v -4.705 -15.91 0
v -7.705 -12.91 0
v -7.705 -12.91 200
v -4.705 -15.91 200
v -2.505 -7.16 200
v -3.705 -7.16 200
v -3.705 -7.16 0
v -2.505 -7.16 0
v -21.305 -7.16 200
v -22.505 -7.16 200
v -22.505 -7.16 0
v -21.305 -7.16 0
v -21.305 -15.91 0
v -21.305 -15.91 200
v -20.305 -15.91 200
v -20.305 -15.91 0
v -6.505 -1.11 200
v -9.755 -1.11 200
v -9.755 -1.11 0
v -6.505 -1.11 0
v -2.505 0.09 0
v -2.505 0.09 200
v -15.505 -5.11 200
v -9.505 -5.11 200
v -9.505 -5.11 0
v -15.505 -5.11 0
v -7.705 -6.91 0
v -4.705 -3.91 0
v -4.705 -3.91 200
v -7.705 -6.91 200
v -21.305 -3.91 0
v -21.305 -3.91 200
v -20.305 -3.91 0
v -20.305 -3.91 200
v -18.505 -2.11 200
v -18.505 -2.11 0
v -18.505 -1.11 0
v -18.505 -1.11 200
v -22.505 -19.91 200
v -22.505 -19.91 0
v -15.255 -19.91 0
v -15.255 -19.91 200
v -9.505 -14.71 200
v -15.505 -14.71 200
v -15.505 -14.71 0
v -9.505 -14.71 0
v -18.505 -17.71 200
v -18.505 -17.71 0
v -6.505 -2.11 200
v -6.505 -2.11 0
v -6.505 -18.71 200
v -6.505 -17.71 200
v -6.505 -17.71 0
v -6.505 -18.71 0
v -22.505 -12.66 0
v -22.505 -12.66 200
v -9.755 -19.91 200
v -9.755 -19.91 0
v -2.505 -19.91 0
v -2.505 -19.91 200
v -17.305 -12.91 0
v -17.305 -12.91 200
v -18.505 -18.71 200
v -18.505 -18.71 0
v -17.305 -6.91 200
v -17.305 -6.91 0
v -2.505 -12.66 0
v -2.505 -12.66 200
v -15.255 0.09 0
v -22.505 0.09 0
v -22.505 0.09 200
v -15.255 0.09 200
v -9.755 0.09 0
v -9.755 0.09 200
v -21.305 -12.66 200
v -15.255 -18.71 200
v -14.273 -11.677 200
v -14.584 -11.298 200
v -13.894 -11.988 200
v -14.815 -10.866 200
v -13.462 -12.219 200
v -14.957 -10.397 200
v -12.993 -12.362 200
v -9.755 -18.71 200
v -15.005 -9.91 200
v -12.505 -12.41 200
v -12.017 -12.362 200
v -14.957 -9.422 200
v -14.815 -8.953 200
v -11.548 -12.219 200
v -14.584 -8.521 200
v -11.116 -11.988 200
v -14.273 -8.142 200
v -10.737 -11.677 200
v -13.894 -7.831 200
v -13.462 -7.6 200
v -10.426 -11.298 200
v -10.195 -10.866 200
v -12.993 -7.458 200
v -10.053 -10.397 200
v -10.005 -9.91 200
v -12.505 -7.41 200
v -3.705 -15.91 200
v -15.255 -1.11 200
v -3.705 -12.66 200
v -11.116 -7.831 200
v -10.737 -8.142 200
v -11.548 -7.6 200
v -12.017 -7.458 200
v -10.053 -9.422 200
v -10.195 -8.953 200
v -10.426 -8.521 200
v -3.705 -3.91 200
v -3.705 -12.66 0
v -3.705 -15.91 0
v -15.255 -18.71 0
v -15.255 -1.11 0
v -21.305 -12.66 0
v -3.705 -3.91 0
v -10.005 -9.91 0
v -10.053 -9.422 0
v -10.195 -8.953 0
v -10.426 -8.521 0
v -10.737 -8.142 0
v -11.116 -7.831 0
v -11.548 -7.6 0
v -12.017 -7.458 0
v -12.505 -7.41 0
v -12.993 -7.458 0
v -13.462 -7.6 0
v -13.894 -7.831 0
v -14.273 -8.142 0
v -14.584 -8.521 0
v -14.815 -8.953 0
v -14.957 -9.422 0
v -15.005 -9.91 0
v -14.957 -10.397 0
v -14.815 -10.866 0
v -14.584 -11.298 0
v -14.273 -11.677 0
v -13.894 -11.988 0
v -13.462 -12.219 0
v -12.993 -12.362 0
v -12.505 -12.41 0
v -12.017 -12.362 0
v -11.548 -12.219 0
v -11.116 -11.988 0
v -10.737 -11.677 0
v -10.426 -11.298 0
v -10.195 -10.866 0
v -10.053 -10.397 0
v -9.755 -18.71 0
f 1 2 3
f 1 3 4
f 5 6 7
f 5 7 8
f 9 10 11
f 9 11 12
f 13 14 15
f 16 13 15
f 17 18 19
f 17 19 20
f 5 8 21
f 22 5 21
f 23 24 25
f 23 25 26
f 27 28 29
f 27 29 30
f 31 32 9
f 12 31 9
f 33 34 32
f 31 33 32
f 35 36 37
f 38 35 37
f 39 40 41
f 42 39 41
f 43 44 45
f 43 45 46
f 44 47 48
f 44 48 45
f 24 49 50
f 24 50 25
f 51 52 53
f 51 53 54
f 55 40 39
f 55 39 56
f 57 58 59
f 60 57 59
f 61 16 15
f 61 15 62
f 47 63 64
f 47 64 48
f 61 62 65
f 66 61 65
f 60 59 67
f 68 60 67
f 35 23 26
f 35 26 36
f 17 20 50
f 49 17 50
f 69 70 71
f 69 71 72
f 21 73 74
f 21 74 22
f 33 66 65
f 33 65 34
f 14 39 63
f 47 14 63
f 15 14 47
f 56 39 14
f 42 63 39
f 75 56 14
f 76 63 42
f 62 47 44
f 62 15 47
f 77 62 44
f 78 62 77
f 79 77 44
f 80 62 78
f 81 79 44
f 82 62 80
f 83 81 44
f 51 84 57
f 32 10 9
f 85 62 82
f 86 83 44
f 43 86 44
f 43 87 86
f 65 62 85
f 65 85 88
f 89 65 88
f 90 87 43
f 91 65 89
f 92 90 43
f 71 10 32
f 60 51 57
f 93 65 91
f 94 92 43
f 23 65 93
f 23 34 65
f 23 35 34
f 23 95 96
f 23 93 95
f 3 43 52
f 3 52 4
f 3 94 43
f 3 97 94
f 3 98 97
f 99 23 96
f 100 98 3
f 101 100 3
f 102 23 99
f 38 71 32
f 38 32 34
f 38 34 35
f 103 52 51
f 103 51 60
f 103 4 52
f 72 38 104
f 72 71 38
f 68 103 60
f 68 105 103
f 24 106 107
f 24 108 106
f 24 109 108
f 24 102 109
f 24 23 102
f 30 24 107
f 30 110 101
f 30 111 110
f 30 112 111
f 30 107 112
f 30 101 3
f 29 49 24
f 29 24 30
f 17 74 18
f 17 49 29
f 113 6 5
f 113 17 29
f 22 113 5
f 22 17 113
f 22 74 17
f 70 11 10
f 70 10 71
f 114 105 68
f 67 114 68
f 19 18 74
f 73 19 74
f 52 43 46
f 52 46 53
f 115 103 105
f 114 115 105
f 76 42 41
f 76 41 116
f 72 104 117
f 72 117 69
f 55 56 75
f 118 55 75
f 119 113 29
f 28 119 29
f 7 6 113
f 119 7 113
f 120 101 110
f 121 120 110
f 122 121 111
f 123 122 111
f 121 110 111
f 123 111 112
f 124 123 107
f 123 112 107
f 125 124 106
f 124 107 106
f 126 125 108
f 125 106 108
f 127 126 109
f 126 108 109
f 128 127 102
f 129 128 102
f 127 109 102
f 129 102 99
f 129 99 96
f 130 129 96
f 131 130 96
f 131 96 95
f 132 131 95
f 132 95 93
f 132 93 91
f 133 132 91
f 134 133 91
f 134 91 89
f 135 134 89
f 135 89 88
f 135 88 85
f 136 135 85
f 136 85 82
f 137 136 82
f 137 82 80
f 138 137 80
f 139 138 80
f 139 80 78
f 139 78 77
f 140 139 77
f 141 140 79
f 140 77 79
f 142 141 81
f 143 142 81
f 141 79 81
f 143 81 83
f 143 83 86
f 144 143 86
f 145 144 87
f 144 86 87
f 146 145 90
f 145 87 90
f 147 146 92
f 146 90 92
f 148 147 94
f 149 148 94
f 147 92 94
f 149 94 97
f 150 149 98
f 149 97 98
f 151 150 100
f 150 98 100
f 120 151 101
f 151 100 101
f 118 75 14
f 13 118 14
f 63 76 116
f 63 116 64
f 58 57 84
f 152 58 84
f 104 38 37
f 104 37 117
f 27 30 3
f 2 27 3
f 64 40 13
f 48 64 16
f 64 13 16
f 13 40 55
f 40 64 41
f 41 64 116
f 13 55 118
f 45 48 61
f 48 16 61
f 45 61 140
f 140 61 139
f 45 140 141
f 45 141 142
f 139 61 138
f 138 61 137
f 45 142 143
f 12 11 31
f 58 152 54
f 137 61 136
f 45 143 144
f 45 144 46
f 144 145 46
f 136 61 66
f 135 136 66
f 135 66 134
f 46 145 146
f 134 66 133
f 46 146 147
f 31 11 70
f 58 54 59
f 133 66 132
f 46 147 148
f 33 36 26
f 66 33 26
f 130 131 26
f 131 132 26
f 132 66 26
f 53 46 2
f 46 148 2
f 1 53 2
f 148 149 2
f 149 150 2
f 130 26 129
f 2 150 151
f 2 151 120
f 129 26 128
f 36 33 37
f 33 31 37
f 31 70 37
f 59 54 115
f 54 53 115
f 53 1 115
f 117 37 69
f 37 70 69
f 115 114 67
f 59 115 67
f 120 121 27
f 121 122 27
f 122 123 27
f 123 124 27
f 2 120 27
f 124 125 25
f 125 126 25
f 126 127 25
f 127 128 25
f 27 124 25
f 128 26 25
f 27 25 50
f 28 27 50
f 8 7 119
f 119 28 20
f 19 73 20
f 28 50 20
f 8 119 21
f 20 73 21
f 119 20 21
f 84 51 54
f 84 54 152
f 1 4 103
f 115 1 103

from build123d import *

# Parameters (mm, degrees)
ESQUISSE1_W             = 20
ESQUISSE1_H             = 20
BOSS_EXTRU_1_DEPTH      = 200
ESQUISSE2_W             = 1.2
ESQUISSE2_H             = 5.5
ESQUISSE2_W_2           = 5.5
ESQUISSE2_H_2           = 1.2
ENL_V_MAT_EXTRU_1_DEPTH = 201
ENL_V_MAT_EXTRU_2_DEPTH = 201
ESQUISSE4_R             = 2.5
ENL_V_MAT_EXTRU_3_DEPTH = 201


with BuildPart() as part:
    # Esquisse1 → Boss.-Extru.1 (new body)
    with BuildSketch(Plane.XY):
        with Locations((-12.505109137, -9.909560068)):
            Rectangle(ESQUISSE1_W, ESQUISSE1_H)
    extrude(amount=BOSS_EXTRU_1_DEPTH)

    # Esquisse2 → Enlèv. mat.-Extru.1 (cut, through all)
    with BuildSketch(Plane.XY.offset(200)):
        with Locations((-21.905109137, -9.909560068)):
            Rectangle(ESQUISSE2_W, ESQUISSE2_H)
        with Locations((-12.505109137, -0.509560068)):
            Rectangle(ESQUISSE2_W_2, ESQUISSE2_H_2)
        with Locations((-3.105109137, -9.909560068)):
            Rectangle(ESQUISSE2_W, ESQUISSE2_H)
        with Locations((-12.505109137, -19.309560068)):
            Rectangle(ESQUISSE2_W_2, ESQUISSE2_H_2)
    extrude(amount=-ENL_V_MAT_EXTRU_1_DEPTH, mode=Mode.SUBTRACT)

    # Esquisse3 → Enlèv. mat.-Extru.2 (cut, through all)
    with BuildSketch(Plane.XY.offset(200)):
        Polygon((-21.305109137, -15.909560068), (-20.305109137, -15.909560068), (-17.305109137, -12.909560068), (-17.305109137, -6.909560068), (-20.305109137, -3.909560068), (-21.305109137, -3.909560068), align=None)
        Polygon((-18.505109137, -1.109560068), (-6.505109137, -1.109560068), (-6.505109137, -2.109560068), (-9.505109137, -5.109560068), (-15.505109137, -5.109560068), (-18.505109137, -2.109560068), align=None)
        Polygon((-3.705109137, -3.909560068), (-4.705109137, -3.909560068), (-7.705109137, -6.909560068), (-7.705109137, -12.909560068), (-4.705109137, -15.909560068), (-3.705109137, -15.909560068), align=None)
        Polygon((-6.505109137, -18.709560068), (-18.505109137, -18.709560068), (-18.505109137, -17.709560068), (-15.505109137, -14.709560068), (-9.505109137, -14.709560068), (-6.505109137, -17.709560068), align=None)
    extrude(amount=-ENL_V_MAT_EXTRU_2_DEPTH, mode=Mode.SUBTRACT)

    # Esquisse4 → Enlèv. mat.-Extru.3 (cut, through all)
    with BuildSketch(Plane.XY.offset(200)):
        with Locations((-12.505109137, -9.909560068)):
            Circle(ESQUISSE4_R)
    extrude(amount=-ENL_V_MAT_EXTRU_3_DEPTH, mode=Mode.SUBTRACT)


solid = part.part
